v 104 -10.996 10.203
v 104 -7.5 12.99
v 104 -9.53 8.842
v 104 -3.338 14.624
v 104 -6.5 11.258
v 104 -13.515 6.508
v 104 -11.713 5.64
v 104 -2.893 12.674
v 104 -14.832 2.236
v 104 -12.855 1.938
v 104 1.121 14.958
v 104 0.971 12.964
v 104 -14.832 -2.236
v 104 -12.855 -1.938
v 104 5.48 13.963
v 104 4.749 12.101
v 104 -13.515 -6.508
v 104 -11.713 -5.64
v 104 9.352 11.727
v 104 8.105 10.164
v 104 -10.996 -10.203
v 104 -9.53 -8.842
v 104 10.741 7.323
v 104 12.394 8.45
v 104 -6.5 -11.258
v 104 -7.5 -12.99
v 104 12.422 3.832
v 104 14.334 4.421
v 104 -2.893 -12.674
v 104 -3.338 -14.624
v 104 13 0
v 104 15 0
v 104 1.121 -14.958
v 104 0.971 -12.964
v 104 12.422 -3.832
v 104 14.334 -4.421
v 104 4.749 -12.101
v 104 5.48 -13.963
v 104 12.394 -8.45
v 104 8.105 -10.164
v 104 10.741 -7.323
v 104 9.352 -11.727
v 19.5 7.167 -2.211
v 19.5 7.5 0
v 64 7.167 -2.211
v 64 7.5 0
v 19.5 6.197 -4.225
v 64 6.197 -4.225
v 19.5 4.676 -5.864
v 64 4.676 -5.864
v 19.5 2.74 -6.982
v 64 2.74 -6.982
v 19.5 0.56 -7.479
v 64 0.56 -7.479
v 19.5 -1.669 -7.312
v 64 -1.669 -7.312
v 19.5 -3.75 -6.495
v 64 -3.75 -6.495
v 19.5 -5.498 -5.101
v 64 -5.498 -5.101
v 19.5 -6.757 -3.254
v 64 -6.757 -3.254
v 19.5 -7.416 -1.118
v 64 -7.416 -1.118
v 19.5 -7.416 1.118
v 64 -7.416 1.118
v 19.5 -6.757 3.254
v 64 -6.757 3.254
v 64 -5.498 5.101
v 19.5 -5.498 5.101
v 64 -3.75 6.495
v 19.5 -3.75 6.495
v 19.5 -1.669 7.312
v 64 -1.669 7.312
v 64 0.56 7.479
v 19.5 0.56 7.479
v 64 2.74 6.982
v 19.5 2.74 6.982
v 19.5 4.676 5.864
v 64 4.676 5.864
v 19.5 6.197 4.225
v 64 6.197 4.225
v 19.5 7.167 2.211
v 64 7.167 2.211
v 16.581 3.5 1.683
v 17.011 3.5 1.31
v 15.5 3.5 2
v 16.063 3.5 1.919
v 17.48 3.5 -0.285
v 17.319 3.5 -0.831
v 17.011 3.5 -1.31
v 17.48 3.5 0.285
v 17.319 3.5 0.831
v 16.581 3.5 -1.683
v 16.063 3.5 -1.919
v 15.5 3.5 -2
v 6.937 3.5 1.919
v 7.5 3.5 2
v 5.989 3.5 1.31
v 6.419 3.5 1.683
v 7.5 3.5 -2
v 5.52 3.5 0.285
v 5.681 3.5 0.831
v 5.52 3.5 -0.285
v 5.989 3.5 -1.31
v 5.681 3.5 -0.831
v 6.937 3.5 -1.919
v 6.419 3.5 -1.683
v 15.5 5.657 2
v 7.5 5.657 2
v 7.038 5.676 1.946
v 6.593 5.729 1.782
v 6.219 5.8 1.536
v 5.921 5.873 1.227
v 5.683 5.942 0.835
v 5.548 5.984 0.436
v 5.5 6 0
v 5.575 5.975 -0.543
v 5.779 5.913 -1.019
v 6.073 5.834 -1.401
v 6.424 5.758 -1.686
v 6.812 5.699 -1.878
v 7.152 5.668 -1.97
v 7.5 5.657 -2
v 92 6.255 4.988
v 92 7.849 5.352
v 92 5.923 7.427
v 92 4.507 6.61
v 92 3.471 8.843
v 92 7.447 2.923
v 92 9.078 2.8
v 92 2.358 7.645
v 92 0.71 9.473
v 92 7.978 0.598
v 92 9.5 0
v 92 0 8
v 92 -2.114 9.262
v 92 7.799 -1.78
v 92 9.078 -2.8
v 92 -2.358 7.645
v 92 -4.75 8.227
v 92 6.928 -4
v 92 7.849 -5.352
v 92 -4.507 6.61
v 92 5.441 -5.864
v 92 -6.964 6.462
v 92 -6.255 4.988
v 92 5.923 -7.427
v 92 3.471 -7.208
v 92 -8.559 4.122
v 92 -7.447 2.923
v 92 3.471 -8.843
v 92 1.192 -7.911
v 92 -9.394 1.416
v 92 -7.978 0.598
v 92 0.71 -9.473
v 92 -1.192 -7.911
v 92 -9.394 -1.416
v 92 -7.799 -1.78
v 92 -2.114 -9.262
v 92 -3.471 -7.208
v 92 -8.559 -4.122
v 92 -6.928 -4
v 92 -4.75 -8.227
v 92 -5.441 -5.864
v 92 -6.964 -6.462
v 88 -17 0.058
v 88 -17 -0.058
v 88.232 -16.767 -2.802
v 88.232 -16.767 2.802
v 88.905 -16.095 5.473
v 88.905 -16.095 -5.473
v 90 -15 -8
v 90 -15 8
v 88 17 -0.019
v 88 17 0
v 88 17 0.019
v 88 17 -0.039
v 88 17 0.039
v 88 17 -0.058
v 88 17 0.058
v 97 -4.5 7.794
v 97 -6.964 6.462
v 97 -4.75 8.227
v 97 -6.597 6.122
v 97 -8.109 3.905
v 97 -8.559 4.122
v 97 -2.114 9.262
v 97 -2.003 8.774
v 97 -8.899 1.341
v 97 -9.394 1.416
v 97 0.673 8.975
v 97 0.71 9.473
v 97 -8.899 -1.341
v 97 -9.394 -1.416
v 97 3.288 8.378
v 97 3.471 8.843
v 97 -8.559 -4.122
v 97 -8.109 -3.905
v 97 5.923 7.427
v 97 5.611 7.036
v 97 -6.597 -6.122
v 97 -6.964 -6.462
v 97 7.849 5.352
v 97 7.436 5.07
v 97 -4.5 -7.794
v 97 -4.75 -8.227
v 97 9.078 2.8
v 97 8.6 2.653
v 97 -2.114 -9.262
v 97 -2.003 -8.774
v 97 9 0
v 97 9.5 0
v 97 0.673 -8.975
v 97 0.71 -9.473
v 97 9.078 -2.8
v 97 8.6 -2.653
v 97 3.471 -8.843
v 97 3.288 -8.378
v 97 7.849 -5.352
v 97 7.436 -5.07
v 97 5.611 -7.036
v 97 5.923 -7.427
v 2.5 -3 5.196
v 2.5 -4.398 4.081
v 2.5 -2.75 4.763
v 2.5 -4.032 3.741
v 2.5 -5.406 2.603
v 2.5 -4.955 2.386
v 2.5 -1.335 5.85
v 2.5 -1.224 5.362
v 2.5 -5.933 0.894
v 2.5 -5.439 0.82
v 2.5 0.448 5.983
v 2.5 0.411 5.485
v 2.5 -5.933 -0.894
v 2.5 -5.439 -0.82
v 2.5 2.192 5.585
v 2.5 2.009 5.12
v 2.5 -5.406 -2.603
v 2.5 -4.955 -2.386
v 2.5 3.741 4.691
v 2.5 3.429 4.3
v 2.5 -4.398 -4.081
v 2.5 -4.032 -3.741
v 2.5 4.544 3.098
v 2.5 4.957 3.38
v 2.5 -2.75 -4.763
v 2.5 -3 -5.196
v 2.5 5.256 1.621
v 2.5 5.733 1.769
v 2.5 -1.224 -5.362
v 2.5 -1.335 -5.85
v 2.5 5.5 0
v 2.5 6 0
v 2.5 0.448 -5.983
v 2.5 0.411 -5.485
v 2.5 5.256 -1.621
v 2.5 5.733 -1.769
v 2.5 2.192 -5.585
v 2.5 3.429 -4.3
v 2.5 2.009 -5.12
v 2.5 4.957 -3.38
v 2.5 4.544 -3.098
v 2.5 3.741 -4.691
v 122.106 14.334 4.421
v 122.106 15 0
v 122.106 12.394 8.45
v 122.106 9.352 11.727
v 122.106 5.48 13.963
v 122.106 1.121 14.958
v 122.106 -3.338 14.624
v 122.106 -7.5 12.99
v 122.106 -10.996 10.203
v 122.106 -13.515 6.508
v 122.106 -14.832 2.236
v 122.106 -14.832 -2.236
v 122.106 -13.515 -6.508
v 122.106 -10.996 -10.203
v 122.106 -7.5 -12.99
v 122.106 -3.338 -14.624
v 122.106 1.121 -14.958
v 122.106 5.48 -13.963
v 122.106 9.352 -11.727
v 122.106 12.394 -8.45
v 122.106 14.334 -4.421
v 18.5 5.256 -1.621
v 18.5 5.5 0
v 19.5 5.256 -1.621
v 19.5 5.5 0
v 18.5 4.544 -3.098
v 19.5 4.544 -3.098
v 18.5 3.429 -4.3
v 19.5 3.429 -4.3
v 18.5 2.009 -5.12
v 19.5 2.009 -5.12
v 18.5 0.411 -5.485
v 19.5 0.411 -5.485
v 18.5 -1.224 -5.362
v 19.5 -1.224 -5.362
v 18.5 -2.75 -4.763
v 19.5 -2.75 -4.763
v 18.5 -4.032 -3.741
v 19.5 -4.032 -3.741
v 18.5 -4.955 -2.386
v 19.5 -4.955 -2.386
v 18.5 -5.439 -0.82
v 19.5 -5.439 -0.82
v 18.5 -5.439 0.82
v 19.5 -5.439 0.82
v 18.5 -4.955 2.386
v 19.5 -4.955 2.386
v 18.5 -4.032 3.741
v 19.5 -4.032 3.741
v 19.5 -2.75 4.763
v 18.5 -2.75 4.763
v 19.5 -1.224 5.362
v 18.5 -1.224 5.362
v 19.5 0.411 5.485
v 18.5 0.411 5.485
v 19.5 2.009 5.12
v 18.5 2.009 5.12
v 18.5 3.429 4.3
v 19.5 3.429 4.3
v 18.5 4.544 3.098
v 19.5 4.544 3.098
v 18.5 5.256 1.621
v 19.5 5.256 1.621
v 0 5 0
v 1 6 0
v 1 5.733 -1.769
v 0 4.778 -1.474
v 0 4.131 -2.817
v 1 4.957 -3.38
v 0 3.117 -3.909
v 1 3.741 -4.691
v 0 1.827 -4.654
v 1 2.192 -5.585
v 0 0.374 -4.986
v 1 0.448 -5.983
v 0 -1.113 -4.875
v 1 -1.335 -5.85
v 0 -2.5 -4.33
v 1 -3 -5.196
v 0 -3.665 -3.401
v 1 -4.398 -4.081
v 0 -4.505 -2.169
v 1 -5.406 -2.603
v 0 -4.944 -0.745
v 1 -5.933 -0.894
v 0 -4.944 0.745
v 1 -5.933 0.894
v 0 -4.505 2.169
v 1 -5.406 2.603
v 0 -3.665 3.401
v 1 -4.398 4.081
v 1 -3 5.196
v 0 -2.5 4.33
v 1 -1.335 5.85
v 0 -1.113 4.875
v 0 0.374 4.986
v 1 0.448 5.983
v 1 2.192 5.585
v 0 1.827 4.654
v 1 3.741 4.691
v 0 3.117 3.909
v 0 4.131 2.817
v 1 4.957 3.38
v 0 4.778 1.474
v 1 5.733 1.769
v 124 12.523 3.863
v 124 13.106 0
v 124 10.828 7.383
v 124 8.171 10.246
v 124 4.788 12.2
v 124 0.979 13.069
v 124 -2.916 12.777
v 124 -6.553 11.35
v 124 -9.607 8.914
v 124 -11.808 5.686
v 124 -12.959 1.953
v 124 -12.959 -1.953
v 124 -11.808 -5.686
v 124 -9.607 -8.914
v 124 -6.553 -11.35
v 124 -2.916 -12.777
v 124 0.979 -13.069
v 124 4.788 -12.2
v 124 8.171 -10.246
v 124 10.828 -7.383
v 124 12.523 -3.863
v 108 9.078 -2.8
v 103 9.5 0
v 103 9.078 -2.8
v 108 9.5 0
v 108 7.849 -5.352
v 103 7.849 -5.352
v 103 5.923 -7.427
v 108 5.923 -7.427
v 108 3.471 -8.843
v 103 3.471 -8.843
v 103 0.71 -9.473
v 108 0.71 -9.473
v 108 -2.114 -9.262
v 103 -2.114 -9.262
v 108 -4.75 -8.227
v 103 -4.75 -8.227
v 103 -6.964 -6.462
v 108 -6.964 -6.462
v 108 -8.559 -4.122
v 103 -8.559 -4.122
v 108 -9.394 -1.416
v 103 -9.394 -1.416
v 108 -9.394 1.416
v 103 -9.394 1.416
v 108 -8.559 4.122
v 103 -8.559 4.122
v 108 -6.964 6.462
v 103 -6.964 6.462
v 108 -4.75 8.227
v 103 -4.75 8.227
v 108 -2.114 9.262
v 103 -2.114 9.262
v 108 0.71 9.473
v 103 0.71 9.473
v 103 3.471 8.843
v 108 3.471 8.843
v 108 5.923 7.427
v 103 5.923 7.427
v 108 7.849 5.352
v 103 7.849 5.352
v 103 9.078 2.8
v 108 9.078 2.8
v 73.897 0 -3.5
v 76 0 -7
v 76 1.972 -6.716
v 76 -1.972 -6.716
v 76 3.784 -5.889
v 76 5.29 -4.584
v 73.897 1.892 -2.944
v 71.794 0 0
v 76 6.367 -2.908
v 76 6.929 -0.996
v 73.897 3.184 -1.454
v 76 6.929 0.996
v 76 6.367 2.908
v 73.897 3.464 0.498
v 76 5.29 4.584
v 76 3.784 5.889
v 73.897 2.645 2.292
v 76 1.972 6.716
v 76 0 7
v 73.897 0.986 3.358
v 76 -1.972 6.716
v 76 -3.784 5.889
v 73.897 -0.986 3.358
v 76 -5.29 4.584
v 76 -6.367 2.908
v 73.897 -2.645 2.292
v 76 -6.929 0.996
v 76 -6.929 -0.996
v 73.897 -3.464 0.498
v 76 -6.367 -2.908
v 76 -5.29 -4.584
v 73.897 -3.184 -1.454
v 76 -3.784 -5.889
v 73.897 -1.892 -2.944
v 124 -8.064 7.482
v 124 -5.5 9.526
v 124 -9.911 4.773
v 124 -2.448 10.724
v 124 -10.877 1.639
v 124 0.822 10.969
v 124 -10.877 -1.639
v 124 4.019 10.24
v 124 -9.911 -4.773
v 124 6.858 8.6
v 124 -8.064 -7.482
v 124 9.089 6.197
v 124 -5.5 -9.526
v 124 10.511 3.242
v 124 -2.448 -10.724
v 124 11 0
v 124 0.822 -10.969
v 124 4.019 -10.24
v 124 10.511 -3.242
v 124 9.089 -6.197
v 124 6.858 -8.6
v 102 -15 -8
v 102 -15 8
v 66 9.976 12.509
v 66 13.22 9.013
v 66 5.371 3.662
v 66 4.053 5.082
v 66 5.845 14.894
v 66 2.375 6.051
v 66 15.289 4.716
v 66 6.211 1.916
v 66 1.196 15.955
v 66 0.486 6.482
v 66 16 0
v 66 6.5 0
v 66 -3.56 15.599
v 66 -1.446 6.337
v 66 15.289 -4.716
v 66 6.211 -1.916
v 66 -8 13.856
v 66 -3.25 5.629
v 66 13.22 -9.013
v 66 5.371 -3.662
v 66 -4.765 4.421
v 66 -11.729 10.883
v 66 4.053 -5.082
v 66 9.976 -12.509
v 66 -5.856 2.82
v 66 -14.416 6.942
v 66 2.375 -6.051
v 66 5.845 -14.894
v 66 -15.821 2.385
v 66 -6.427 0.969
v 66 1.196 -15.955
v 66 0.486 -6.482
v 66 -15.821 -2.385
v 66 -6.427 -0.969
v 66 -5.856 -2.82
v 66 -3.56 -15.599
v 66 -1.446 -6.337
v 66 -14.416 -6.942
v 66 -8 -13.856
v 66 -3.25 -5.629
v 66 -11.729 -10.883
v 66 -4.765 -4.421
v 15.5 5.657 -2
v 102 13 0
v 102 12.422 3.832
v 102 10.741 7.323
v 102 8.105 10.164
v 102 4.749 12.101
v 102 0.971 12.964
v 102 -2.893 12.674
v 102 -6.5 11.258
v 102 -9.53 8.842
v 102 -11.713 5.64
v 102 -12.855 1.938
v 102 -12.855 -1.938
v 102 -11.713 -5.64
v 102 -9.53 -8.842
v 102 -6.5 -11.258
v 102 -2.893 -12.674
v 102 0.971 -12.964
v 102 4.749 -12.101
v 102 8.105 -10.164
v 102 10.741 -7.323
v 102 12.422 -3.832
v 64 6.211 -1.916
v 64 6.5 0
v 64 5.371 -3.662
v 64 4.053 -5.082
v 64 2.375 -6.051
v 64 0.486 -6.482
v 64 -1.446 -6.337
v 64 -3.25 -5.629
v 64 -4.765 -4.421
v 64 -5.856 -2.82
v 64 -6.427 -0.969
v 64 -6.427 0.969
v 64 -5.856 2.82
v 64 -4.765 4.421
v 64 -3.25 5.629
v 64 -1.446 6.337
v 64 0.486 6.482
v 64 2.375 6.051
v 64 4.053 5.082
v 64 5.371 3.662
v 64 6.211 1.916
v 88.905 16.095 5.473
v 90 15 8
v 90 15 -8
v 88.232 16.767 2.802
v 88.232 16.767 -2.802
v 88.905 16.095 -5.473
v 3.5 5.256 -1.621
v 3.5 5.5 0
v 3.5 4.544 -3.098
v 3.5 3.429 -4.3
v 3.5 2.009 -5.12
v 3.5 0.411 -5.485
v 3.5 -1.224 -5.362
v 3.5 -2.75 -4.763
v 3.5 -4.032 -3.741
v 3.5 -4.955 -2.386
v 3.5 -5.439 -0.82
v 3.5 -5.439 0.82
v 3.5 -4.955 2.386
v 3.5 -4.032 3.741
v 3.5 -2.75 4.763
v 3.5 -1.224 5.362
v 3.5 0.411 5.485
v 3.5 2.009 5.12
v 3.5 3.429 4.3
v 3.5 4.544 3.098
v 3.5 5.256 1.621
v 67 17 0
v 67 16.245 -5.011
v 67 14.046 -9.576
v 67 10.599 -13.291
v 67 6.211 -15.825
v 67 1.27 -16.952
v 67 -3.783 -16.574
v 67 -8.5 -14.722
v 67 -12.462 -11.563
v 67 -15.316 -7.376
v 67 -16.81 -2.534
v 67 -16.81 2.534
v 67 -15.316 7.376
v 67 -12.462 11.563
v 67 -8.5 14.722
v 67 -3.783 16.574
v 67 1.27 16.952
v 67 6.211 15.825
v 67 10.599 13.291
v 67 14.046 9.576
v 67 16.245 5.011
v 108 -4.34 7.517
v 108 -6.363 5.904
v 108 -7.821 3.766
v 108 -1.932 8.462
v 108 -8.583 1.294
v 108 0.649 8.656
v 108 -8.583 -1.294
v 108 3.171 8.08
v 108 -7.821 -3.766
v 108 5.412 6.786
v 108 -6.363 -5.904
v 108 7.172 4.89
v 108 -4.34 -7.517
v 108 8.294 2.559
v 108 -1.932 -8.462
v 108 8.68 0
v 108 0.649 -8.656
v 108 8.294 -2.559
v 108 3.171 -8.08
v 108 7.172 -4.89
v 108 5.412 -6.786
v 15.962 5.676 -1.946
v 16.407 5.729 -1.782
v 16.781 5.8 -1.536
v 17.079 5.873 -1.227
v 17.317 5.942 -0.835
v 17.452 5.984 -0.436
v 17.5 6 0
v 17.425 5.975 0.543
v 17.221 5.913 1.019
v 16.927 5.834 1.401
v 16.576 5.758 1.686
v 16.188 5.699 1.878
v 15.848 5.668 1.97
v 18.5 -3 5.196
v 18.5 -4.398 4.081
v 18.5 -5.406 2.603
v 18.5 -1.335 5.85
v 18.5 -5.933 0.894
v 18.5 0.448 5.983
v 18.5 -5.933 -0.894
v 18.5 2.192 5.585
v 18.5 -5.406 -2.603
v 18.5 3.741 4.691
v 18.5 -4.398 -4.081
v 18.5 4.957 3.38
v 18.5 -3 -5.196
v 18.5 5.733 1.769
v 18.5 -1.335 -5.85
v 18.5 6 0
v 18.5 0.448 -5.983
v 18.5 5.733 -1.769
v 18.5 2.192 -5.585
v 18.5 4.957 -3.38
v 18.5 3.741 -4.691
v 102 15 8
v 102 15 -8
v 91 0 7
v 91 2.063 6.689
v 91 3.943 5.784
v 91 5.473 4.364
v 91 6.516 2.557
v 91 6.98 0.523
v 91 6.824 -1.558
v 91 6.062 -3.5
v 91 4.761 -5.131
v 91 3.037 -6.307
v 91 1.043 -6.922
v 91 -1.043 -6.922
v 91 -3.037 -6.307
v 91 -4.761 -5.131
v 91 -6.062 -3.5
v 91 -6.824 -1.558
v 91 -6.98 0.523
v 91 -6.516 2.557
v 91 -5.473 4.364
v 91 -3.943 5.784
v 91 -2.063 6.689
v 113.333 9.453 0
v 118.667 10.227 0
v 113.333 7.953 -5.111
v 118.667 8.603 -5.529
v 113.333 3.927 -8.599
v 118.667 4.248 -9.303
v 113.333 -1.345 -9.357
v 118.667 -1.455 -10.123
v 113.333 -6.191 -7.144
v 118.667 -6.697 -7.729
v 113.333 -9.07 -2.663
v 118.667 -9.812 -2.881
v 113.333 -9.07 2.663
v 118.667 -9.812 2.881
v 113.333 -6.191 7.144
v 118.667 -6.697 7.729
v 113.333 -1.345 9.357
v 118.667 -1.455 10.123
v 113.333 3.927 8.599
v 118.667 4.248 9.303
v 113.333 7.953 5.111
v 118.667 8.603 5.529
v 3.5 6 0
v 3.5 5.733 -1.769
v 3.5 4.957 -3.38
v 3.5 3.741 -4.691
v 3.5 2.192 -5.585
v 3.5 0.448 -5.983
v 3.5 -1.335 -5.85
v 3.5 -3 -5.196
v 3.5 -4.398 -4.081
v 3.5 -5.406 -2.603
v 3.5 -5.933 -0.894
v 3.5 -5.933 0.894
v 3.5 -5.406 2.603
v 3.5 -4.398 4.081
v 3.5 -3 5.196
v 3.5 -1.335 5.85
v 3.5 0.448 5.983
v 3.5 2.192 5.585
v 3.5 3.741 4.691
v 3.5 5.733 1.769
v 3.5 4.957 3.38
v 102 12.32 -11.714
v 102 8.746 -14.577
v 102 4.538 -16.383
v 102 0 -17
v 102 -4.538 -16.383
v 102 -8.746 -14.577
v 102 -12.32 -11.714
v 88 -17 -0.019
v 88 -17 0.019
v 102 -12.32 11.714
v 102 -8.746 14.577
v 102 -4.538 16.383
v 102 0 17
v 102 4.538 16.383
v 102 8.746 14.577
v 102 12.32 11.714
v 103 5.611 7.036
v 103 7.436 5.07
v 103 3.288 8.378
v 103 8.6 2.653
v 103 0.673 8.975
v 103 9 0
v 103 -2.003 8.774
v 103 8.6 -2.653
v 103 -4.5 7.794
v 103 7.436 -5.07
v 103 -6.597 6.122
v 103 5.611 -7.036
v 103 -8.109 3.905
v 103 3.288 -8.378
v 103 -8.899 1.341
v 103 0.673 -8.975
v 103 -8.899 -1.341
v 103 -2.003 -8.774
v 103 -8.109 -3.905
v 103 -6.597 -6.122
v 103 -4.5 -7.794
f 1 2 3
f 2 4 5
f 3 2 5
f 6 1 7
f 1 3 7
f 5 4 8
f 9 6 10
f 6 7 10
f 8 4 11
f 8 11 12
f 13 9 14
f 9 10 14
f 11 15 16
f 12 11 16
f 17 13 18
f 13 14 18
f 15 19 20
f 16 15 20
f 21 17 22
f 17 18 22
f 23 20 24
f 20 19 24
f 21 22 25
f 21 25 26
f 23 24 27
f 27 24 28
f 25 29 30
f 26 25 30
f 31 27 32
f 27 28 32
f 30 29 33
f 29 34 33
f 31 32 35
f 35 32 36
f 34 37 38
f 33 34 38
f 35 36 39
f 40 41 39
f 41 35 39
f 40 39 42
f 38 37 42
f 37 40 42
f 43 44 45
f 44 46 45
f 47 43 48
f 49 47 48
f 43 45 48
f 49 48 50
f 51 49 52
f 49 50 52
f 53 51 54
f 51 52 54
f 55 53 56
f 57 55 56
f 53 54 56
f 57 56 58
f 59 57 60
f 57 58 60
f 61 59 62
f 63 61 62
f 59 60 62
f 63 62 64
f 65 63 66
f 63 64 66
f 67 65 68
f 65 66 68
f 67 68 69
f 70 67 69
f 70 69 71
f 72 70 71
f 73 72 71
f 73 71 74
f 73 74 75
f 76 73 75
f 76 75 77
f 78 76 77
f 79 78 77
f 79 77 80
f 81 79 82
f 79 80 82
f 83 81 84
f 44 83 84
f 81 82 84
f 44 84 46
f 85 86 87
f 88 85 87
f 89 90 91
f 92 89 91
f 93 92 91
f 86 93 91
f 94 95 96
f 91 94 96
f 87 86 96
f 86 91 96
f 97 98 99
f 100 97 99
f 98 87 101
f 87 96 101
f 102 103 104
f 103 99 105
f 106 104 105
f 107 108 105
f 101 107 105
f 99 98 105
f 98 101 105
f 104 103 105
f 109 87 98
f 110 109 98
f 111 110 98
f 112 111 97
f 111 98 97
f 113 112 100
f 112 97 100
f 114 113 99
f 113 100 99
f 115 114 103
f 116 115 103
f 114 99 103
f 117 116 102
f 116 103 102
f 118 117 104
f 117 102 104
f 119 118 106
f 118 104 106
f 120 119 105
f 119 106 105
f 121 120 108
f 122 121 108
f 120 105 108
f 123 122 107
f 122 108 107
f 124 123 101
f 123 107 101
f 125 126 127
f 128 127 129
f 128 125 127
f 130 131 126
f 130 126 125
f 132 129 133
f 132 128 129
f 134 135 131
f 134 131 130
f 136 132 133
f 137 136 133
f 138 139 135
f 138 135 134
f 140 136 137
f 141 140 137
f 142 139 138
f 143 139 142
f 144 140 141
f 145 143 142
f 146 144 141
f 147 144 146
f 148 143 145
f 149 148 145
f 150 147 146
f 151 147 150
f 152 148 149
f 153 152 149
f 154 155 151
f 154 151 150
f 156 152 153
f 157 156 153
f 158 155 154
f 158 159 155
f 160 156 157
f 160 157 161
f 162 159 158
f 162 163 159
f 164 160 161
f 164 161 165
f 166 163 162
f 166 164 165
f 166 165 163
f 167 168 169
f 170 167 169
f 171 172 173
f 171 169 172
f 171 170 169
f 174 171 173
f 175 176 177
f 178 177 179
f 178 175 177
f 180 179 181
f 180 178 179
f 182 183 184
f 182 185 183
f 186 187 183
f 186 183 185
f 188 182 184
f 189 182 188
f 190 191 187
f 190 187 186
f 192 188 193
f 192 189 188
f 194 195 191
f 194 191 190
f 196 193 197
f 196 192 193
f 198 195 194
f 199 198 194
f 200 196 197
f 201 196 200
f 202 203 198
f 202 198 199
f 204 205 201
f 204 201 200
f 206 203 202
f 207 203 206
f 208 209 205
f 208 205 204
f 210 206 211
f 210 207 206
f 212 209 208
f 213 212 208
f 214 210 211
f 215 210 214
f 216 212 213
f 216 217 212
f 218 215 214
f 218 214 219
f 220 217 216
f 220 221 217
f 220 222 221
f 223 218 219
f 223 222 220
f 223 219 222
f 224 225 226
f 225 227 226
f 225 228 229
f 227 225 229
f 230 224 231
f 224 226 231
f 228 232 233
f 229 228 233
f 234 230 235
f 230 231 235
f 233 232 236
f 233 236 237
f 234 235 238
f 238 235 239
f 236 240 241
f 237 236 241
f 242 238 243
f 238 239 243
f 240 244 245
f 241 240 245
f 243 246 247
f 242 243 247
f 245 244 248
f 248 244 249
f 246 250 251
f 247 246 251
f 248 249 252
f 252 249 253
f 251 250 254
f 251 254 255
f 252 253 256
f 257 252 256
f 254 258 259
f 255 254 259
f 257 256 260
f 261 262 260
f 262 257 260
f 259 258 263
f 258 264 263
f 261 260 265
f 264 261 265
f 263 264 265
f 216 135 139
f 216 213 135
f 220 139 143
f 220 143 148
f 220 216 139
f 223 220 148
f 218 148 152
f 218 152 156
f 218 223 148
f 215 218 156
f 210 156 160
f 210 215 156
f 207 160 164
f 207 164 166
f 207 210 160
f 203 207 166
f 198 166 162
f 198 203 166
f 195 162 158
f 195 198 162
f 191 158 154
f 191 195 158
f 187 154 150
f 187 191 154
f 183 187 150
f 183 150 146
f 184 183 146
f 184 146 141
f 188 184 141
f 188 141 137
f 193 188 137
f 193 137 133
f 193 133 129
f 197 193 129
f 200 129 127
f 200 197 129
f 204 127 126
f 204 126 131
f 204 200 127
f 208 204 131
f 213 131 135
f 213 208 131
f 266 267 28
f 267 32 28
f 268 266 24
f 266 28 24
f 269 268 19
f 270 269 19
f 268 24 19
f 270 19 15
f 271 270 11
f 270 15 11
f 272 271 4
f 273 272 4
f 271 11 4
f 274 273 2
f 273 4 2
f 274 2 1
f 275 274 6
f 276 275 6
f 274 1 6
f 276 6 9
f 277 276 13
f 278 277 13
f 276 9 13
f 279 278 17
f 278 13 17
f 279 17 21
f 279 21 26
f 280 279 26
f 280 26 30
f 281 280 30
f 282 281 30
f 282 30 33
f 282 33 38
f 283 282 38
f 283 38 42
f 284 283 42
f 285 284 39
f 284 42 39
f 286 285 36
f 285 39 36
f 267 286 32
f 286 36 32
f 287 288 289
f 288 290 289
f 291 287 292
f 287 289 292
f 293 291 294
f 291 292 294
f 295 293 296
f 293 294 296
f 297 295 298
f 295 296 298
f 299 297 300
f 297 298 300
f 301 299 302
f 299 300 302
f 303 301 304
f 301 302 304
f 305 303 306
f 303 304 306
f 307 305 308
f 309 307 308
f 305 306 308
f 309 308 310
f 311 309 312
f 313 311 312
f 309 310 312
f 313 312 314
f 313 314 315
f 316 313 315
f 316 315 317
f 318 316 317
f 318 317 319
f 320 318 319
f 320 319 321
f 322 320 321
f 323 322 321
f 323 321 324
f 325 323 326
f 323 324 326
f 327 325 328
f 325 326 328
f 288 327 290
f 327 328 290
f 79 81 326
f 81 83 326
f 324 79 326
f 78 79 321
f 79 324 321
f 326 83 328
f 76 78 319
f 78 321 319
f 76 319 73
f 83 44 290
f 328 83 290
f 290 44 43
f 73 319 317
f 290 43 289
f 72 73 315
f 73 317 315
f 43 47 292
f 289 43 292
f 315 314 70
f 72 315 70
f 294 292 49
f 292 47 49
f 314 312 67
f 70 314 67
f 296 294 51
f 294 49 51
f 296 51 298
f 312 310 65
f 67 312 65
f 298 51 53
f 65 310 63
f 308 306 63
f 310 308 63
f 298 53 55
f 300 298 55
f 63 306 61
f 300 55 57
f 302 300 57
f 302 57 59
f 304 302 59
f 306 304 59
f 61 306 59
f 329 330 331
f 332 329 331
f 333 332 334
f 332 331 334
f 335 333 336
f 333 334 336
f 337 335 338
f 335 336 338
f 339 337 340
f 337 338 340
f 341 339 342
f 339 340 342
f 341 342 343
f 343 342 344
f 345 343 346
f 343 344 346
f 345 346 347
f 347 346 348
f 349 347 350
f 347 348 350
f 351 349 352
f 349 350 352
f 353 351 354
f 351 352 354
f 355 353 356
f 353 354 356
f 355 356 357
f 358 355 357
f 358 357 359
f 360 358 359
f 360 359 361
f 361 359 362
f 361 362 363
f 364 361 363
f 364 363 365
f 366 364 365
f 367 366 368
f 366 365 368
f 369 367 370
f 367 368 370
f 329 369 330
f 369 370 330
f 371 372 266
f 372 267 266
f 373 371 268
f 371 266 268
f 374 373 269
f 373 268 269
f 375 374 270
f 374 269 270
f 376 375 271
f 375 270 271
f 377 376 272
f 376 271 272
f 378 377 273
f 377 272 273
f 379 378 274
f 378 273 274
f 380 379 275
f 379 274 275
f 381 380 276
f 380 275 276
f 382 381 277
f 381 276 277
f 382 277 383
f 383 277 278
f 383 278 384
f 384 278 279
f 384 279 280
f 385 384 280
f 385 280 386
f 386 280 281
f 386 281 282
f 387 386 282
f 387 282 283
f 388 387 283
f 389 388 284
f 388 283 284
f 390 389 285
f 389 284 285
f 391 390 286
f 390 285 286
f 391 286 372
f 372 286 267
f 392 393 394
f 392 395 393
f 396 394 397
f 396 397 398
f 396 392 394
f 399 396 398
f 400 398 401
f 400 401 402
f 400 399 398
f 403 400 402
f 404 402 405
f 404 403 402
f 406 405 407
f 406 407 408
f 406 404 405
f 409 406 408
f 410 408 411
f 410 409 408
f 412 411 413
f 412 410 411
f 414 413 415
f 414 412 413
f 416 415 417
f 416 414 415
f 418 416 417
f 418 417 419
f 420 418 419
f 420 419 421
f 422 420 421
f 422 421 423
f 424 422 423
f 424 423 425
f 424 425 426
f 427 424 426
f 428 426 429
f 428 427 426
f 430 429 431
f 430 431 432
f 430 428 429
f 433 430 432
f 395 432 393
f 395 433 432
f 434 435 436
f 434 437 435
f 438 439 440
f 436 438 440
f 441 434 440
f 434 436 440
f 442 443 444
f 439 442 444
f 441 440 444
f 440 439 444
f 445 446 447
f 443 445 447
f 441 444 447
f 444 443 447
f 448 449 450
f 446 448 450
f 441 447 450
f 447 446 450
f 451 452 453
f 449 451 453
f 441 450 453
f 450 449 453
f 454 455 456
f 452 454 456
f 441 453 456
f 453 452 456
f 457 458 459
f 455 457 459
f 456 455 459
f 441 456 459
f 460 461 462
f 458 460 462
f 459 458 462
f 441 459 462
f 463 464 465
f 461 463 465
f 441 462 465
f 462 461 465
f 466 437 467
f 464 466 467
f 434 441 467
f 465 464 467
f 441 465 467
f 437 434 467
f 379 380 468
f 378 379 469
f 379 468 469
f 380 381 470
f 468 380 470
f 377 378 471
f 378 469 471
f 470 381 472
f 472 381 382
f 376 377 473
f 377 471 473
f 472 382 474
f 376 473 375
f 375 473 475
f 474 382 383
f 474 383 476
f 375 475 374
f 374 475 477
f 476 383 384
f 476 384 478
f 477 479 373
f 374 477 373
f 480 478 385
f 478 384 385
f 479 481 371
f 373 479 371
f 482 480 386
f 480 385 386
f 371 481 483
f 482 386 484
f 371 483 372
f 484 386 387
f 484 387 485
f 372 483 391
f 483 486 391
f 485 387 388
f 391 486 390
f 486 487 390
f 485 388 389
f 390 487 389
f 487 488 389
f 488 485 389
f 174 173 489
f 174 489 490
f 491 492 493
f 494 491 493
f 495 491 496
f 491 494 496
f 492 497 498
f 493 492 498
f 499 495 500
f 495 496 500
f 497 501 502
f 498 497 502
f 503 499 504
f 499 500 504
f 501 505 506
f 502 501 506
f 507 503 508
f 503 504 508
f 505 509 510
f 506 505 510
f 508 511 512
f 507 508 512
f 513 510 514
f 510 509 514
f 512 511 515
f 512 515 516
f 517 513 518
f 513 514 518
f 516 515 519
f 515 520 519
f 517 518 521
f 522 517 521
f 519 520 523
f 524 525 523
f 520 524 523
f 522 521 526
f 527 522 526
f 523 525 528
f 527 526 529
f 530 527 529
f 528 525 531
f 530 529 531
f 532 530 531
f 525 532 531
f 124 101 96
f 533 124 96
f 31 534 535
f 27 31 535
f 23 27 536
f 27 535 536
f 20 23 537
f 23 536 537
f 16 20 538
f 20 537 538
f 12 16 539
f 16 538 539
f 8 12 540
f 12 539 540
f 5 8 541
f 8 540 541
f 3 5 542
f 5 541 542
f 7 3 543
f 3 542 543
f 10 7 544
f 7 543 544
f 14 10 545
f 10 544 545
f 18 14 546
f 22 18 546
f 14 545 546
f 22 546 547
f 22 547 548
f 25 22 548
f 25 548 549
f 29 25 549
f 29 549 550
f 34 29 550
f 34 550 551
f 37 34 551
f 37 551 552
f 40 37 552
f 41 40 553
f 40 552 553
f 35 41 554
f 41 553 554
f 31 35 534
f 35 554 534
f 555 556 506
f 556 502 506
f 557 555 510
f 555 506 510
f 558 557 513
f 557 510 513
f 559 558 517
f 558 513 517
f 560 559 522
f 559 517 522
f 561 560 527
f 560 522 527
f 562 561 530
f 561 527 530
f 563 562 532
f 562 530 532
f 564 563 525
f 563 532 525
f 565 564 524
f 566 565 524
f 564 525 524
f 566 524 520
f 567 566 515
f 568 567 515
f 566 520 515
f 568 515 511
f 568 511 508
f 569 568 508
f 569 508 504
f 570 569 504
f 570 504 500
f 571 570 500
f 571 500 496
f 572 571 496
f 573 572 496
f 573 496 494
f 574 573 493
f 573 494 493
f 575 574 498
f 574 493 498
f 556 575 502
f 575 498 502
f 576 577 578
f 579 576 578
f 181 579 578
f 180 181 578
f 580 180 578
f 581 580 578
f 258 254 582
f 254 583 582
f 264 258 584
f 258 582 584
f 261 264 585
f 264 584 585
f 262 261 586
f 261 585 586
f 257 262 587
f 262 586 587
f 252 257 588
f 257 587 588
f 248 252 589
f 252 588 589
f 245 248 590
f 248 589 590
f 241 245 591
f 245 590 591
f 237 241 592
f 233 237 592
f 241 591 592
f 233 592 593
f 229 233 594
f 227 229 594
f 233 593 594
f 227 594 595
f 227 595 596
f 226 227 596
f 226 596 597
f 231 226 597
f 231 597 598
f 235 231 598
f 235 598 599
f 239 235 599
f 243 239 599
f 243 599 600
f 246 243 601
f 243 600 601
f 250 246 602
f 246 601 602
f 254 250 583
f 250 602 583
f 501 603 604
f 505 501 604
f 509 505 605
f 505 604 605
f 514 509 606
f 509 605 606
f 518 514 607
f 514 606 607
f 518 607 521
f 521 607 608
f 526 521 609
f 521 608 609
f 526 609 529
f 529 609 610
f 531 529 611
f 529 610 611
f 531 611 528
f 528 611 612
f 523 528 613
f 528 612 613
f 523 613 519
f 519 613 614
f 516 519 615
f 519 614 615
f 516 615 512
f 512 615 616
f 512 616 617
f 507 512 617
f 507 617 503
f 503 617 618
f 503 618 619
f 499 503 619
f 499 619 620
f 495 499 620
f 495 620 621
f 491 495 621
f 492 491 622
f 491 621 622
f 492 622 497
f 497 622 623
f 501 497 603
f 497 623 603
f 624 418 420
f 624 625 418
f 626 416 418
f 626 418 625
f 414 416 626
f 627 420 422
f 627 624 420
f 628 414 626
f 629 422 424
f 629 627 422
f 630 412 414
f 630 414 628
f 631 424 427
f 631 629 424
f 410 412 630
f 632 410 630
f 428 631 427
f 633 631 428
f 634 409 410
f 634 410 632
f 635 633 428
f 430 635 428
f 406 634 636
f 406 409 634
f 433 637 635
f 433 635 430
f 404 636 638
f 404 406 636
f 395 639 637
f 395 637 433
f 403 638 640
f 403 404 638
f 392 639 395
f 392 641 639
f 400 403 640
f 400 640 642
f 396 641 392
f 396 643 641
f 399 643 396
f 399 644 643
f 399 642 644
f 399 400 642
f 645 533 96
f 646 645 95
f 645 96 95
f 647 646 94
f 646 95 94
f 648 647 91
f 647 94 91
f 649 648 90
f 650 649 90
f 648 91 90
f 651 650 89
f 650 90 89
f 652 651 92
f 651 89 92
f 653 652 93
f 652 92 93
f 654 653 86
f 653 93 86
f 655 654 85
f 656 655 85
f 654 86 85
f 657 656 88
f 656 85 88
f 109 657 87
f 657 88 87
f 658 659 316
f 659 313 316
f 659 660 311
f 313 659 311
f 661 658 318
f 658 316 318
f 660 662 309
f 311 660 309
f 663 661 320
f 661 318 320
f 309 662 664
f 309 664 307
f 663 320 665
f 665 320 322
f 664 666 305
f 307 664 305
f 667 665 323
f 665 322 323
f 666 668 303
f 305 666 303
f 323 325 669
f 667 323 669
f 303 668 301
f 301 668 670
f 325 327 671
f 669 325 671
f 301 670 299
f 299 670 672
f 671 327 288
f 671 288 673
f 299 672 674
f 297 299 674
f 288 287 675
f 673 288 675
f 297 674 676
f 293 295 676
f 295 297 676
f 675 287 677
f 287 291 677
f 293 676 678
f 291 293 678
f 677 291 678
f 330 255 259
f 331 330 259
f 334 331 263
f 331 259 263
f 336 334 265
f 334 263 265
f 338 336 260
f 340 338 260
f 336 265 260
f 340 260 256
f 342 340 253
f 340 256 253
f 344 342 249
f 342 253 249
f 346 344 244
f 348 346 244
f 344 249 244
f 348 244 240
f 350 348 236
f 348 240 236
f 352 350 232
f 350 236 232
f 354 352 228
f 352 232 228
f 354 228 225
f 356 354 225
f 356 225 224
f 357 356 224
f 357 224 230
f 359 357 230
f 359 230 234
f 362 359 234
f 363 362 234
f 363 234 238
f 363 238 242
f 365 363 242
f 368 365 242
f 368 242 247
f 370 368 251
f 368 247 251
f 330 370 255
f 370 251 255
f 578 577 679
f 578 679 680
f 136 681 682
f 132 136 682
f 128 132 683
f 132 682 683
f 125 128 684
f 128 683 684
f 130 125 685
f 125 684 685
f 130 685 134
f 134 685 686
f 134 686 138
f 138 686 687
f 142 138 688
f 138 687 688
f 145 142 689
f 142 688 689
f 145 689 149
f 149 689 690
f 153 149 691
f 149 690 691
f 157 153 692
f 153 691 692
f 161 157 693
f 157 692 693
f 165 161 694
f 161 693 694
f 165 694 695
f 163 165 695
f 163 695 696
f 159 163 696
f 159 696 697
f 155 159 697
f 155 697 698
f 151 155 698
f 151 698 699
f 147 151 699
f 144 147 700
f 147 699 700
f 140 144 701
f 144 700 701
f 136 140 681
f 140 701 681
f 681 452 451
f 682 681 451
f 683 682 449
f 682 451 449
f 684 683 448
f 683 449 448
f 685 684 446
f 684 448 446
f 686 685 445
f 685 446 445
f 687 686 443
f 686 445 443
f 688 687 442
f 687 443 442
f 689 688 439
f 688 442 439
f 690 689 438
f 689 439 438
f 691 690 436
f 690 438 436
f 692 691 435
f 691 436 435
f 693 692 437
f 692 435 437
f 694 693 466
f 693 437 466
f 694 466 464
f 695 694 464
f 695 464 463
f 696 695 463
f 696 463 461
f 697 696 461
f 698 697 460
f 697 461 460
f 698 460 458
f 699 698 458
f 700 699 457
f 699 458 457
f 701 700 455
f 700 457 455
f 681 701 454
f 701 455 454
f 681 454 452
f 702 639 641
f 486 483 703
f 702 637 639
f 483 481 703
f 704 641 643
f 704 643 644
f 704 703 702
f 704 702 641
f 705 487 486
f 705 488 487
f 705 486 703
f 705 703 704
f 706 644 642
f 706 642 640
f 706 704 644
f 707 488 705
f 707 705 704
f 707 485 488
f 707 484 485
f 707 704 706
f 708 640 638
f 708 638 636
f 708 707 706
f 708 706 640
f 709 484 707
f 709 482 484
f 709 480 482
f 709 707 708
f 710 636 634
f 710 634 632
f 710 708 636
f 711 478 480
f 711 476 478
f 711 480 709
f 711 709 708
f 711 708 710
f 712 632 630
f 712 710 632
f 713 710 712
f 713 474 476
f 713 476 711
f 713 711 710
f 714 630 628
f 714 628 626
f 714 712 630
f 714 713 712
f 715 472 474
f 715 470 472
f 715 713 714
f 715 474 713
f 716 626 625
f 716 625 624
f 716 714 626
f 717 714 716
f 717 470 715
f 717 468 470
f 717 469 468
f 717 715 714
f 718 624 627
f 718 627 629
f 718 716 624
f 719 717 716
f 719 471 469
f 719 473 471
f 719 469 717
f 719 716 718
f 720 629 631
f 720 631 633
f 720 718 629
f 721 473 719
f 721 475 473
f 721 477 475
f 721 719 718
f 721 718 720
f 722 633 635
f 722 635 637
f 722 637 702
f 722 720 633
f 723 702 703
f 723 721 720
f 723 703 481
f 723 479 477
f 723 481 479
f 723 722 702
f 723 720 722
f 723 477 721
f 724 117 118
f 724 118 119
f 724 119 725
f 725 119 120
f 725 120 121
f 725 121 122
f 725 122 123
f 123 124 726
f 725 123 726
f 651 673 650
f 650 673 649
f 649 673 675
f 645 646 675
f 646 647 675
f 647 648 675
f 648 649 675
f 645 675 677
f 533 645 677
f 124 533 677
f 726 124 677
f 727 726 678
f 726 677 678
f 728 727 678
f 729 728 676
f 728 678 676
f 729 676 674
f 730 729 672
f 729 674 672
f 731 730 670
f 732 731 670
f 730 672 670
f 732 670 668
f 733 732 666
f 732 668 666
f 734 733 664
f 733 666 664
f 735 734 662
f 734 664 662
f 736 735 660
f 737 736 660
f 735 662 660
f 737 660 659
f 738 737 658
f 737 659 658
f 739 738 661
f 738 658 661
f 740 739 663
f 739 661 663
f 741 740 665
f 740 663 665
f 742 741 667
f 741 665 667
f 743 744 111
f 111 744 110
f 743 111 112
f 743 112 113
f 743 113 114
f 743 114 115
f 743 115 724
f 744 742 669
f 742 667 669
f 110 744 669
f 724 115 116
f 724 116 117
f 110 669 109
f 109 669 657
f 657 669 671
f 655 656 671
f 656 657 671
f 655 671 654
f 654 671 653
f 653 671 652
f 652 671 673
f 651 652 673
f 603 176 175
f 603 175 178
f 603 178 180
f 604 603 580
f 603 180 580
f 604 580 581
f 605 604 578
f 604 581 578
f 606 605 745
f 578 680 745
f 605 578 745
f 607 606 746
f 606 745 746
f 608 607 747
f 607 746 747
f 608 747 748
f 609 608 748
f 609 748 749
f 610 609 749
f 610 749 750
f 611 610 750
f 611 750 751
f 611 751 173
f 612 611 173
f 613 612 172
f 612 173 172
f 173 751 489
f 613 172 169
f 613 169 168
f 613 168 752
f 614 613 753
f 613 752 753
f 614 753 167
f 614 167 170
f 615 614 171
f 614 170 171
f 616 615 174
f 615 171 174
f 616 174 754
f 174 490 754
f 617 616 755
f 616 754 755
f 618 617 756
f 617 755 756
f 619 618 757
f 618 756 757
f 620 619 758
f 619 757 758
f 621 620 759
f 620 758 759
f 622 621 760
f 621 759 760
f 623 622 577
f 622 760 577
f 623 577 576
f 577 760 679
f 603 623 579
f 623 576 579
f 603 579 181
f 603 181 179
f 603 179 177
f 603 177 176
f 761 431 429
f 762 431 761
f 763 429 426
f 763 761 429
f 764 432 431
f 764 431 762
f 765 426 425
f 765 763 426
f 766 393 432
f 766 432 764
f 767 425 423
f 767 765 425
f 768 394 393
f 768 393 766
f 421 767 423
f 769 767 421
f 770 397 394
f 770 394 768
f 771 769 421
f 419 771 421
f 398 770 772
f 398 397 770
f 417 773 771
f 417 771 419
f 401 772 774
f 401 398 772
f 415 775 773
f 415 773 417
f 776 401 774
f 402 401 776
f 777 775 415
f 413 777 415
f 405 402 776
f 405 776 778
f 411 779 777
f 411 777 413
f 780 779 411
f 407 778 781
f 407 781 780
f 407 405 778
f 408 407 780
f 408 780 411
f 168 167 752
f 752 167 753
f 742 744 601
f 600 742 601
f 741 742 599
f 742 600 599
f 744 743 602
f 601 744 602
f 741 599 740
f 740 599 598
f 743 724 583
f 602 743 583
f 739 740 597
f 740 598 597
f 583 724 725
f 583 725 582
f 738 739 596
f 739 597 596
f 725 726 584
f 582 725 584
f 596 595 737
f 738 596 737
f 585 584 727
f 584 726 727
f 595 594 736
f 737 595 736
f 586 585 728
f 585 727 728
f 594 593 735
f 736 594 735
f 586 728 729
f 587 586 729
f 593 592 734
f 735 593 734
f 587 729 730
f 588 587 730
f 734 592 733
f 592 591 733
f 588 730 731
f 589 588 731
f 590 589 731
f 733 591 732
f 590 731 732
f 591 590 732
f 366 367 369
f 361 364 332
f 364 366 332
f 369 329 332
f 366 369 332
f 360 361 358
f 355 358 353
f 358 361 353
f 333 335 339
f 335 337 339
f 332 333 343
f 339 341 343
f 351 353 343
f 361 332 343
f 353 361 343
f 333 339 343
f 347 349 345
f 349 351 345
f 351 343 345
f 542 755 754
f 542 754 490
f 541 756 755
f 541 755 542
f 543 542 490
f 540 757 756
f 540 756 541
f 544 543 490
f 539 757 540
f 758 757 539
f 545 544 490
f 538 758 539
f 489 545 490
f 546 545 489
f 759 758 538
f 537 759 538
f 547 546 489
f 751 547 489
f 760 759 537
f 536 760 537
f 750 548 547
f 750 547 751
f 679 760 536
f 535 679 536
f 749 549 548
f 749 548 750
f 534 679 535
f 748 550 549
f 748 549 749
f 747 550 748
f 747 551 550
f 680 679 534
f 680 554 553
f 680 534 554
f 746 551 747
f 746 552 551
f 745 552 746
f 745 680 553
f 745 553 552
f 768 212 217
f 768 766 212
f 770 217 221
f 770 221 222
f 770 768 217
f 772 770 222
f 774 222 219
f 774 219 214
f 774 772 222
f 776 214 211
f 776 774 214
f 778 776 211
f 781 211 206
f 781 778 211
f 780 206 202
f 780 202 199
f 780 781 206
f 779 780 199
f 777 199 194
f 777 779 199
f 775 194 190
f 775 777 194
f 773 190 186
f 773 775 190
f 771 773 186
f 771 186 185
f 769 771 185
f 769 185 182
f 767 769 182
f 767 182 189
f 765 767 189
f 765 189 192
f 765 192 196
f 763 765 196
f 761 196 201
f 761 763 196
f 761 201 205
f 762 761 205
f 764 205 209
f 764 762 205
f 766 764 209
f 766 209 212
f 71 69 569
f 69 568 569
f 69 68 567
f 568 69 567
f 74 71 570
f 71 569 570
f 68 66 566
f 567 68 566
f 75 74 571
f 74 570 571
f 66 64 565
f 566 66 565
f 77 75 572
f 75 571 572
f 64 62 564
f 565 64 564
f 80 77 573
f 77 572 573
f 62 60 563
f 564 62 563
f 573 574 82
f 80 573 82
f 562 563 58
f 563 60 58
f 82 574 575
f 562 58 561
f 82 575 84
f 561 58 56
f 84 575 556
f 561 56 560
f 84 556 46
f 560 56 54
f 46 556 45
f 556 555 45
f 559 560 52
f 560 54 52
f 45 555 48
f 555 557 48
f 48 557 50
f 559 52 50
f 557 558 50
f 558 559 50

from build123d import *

# Parameters (mm, degrees)
CHAMFER_1_SIZE              = 1
CUT_EXTRUDE_START           = -22
SKETCH_2_OUTSIDE_W          = 62.6
SKETCH_2_OUTSIDE_H          = 62.6
SKETCH_2_OUTSIDE_R          = 13
CUT_EXTRUDE_1_DEPTH         = 2
CUT_EXTRUDE_START_2         = -14
CUT_EXTRUDE_2_DEPTH         = 14
CHAMFER_2_SIZE              = 2
CUT_EXTRUDE_START_3         = 3.5
CUT_EXTRUDE_3_DEPTH         = 123.809144562
HOLE_WIZARD_14_0_14_1_D     = 14
HOLE_WIZARD_14_0_14_1_DEPTH = 16
HOLE_WIZARD_14_0_14_1_TIP   = 4.206024333
CHAMFER_3_SIZE              = 1


# Read off the part's stored shape, not the designer's step: M30 机械螺纹 螺柱1, 切除-拉伸2
with BuildPart() as part:
    # 草图1 → 旋转1 (revolve)
    with BuildSketch(Plane.XY):
        Polygon((0, 0), (0, 6), (2.5, 6), (2.5, 5.5), (3.5, 5.5), (3.5, 6), (18.5, 6), (18.5, 5.5), (19.5, 5.5), (19.5, 7.5), (64, 7.5), (64, 6.5), (66, 6.5), (66, 17), (124, 17), (124, 0), align=None)
    revolve(axis=Axis((124, 0, 0), (-1, 0, 0)))

    # 倒角1
    chamfer_1_edges = [part.edges().sort_by_distance(p)[0] for p in [
        (66, -17, 0),
        (0, -6, 0),
    ]]
    chamfer(chamfer_1_edges, length=CHAMFER_1_SIZE)

    # 草图2 outside → 切除-拉伸1 (cut)
    with BuildSketch(Plane(origin=(124, 0, 0), x_dir=(0, 0, -1), z_dir=(1, 0, 0)).offset(CUT_EXTRUDE_START)):
        Rectangle(SKETCH_2_OUTSIDE_W, SKETCH_2_OUTSIDE_H)
        with Locations(Location((0, 0, 0), (0, 0, 90))):
            Circle(SKETCH_2_OUTSIDE_R, mode=Mode.SUBTRACT)
    extrude(amount=CUT_EXTRUDE_1_DEPTH, mode=Mode.SUBTRACT)

    # M30 机械螺纹 螺柱1 outline → M30 机械螺纹 螺柱1 (revolve, cut)
    with BuildSketch(Plane.YX):
        Polygon((17, 124), (13.1055, 124), (15, 122.1055), (15, 104), (17, 104), align=None)
    revolve(axis=Axis((0, 0, 0), (1, 0, 0)), mode=Mode.SUBTRACT)

    # 切除-拉伸2 outline → 切除-拉伸2 (cut)
    with BuildSketch(Plane(origin=(102, 0, 0), x_dir=(0, 0, -1), z_dir=(1, 0, 0)).offset(CUT_EXTRUDE_START_2)):
        with BuildLine():
            Line((-8, 15), (8, 15))
            ThreePointArc((8, 15), (0, 17), (-8, 15))
        make_face()
        with BuildLine():
            Line((8, -15), (-8, -15))
            ThreePointArc((-8, -15), (0, -17), (8, -15))
        make_face()
    extrude(amount=CUT_EXTRUDE_2_DEPTH, mode=Mode.SUBTRACT)

    # 倒角2
    chamfer_2_edges = [part.edges().sort_by_distance(p)[0] for p in [
        (88, -15, 0),
        (88, 15, 0),
    ]]
    chamfer(chamfer_2_edges, length=CHAMFER_2_SIZE - 0.0001)  # a hair under: the kernel refuses the full size

    # 草图5 → 切除-拉伸3 (cut, through all)
    with BuildSketch(Plane(origin=(0, 0, 0), x_dir=(1, 0, 0), z_dir=(0, 1, 0)).offset(CUT_EXTRUDE_START_3)):
        with BuildLine():
            Line((15.5, -2), (7.5, -2))
            ThreePointArc((7.5, -2), (5.5, 0), (7.5, 2))
            Line((7.5, 2), (15.5, 2))
            ThreePointArc((15.5, 2), (17.5, 0), (15.5, -2))
        make_face()
    extrude(amount=CUT_EXTRUDE_3_DEPTH, mode=Mode.SUBTRACT)

    # 草图6 → 切除-旋转1 (revolve, cut)
    with BuildSketch(Plane.XY):
        Polygon((92, 0), (92, 9.5), (97, 9.5), (97, 9), (103, 9), (103, 9.5), (108, 9.5), (108, 8.680110408), (124, 11), (124, 0), align=None)
    revolve(axis=Axis((124, 0, 0), (-1, 0, 0)), mode=Mode.SUBTRACT)

    # Ø14.0 (14) 直径孔1
    with Locations(Plane(origin=(92, 0, 0), x_dir=(0, 0, -1), z_dir=(1, 0, 0))):
        with Locations((0, 0)):
            Hole(HOLE_WIZARD_14_0_14_1_D / 2, depth=HOLE_WIZARD_14_0_14_1_DEPTH)
            with Locations((0, 0, -(HOLE_WIZARD_14_0_14_1_DEPTH + HOLE_WIZARD_14_0_14_1_TIP / 2))):  # 118° drill point
                Cone(0, HOLE_WIZARD_14_0_14_1_D / 2, HOLE_WIZARD_14_0_14_1_TIP, mode=Mode.SUBTRACT)

    # 倒角3
    chamfer_3_edges = [part.edges().sort_by_distance(p)[0] for p in [
        (92, 0, -7),
    ]]
    chamfer(chamfer_3_edges, length=CHAMFER_3_SIZE)


solid = part.part
